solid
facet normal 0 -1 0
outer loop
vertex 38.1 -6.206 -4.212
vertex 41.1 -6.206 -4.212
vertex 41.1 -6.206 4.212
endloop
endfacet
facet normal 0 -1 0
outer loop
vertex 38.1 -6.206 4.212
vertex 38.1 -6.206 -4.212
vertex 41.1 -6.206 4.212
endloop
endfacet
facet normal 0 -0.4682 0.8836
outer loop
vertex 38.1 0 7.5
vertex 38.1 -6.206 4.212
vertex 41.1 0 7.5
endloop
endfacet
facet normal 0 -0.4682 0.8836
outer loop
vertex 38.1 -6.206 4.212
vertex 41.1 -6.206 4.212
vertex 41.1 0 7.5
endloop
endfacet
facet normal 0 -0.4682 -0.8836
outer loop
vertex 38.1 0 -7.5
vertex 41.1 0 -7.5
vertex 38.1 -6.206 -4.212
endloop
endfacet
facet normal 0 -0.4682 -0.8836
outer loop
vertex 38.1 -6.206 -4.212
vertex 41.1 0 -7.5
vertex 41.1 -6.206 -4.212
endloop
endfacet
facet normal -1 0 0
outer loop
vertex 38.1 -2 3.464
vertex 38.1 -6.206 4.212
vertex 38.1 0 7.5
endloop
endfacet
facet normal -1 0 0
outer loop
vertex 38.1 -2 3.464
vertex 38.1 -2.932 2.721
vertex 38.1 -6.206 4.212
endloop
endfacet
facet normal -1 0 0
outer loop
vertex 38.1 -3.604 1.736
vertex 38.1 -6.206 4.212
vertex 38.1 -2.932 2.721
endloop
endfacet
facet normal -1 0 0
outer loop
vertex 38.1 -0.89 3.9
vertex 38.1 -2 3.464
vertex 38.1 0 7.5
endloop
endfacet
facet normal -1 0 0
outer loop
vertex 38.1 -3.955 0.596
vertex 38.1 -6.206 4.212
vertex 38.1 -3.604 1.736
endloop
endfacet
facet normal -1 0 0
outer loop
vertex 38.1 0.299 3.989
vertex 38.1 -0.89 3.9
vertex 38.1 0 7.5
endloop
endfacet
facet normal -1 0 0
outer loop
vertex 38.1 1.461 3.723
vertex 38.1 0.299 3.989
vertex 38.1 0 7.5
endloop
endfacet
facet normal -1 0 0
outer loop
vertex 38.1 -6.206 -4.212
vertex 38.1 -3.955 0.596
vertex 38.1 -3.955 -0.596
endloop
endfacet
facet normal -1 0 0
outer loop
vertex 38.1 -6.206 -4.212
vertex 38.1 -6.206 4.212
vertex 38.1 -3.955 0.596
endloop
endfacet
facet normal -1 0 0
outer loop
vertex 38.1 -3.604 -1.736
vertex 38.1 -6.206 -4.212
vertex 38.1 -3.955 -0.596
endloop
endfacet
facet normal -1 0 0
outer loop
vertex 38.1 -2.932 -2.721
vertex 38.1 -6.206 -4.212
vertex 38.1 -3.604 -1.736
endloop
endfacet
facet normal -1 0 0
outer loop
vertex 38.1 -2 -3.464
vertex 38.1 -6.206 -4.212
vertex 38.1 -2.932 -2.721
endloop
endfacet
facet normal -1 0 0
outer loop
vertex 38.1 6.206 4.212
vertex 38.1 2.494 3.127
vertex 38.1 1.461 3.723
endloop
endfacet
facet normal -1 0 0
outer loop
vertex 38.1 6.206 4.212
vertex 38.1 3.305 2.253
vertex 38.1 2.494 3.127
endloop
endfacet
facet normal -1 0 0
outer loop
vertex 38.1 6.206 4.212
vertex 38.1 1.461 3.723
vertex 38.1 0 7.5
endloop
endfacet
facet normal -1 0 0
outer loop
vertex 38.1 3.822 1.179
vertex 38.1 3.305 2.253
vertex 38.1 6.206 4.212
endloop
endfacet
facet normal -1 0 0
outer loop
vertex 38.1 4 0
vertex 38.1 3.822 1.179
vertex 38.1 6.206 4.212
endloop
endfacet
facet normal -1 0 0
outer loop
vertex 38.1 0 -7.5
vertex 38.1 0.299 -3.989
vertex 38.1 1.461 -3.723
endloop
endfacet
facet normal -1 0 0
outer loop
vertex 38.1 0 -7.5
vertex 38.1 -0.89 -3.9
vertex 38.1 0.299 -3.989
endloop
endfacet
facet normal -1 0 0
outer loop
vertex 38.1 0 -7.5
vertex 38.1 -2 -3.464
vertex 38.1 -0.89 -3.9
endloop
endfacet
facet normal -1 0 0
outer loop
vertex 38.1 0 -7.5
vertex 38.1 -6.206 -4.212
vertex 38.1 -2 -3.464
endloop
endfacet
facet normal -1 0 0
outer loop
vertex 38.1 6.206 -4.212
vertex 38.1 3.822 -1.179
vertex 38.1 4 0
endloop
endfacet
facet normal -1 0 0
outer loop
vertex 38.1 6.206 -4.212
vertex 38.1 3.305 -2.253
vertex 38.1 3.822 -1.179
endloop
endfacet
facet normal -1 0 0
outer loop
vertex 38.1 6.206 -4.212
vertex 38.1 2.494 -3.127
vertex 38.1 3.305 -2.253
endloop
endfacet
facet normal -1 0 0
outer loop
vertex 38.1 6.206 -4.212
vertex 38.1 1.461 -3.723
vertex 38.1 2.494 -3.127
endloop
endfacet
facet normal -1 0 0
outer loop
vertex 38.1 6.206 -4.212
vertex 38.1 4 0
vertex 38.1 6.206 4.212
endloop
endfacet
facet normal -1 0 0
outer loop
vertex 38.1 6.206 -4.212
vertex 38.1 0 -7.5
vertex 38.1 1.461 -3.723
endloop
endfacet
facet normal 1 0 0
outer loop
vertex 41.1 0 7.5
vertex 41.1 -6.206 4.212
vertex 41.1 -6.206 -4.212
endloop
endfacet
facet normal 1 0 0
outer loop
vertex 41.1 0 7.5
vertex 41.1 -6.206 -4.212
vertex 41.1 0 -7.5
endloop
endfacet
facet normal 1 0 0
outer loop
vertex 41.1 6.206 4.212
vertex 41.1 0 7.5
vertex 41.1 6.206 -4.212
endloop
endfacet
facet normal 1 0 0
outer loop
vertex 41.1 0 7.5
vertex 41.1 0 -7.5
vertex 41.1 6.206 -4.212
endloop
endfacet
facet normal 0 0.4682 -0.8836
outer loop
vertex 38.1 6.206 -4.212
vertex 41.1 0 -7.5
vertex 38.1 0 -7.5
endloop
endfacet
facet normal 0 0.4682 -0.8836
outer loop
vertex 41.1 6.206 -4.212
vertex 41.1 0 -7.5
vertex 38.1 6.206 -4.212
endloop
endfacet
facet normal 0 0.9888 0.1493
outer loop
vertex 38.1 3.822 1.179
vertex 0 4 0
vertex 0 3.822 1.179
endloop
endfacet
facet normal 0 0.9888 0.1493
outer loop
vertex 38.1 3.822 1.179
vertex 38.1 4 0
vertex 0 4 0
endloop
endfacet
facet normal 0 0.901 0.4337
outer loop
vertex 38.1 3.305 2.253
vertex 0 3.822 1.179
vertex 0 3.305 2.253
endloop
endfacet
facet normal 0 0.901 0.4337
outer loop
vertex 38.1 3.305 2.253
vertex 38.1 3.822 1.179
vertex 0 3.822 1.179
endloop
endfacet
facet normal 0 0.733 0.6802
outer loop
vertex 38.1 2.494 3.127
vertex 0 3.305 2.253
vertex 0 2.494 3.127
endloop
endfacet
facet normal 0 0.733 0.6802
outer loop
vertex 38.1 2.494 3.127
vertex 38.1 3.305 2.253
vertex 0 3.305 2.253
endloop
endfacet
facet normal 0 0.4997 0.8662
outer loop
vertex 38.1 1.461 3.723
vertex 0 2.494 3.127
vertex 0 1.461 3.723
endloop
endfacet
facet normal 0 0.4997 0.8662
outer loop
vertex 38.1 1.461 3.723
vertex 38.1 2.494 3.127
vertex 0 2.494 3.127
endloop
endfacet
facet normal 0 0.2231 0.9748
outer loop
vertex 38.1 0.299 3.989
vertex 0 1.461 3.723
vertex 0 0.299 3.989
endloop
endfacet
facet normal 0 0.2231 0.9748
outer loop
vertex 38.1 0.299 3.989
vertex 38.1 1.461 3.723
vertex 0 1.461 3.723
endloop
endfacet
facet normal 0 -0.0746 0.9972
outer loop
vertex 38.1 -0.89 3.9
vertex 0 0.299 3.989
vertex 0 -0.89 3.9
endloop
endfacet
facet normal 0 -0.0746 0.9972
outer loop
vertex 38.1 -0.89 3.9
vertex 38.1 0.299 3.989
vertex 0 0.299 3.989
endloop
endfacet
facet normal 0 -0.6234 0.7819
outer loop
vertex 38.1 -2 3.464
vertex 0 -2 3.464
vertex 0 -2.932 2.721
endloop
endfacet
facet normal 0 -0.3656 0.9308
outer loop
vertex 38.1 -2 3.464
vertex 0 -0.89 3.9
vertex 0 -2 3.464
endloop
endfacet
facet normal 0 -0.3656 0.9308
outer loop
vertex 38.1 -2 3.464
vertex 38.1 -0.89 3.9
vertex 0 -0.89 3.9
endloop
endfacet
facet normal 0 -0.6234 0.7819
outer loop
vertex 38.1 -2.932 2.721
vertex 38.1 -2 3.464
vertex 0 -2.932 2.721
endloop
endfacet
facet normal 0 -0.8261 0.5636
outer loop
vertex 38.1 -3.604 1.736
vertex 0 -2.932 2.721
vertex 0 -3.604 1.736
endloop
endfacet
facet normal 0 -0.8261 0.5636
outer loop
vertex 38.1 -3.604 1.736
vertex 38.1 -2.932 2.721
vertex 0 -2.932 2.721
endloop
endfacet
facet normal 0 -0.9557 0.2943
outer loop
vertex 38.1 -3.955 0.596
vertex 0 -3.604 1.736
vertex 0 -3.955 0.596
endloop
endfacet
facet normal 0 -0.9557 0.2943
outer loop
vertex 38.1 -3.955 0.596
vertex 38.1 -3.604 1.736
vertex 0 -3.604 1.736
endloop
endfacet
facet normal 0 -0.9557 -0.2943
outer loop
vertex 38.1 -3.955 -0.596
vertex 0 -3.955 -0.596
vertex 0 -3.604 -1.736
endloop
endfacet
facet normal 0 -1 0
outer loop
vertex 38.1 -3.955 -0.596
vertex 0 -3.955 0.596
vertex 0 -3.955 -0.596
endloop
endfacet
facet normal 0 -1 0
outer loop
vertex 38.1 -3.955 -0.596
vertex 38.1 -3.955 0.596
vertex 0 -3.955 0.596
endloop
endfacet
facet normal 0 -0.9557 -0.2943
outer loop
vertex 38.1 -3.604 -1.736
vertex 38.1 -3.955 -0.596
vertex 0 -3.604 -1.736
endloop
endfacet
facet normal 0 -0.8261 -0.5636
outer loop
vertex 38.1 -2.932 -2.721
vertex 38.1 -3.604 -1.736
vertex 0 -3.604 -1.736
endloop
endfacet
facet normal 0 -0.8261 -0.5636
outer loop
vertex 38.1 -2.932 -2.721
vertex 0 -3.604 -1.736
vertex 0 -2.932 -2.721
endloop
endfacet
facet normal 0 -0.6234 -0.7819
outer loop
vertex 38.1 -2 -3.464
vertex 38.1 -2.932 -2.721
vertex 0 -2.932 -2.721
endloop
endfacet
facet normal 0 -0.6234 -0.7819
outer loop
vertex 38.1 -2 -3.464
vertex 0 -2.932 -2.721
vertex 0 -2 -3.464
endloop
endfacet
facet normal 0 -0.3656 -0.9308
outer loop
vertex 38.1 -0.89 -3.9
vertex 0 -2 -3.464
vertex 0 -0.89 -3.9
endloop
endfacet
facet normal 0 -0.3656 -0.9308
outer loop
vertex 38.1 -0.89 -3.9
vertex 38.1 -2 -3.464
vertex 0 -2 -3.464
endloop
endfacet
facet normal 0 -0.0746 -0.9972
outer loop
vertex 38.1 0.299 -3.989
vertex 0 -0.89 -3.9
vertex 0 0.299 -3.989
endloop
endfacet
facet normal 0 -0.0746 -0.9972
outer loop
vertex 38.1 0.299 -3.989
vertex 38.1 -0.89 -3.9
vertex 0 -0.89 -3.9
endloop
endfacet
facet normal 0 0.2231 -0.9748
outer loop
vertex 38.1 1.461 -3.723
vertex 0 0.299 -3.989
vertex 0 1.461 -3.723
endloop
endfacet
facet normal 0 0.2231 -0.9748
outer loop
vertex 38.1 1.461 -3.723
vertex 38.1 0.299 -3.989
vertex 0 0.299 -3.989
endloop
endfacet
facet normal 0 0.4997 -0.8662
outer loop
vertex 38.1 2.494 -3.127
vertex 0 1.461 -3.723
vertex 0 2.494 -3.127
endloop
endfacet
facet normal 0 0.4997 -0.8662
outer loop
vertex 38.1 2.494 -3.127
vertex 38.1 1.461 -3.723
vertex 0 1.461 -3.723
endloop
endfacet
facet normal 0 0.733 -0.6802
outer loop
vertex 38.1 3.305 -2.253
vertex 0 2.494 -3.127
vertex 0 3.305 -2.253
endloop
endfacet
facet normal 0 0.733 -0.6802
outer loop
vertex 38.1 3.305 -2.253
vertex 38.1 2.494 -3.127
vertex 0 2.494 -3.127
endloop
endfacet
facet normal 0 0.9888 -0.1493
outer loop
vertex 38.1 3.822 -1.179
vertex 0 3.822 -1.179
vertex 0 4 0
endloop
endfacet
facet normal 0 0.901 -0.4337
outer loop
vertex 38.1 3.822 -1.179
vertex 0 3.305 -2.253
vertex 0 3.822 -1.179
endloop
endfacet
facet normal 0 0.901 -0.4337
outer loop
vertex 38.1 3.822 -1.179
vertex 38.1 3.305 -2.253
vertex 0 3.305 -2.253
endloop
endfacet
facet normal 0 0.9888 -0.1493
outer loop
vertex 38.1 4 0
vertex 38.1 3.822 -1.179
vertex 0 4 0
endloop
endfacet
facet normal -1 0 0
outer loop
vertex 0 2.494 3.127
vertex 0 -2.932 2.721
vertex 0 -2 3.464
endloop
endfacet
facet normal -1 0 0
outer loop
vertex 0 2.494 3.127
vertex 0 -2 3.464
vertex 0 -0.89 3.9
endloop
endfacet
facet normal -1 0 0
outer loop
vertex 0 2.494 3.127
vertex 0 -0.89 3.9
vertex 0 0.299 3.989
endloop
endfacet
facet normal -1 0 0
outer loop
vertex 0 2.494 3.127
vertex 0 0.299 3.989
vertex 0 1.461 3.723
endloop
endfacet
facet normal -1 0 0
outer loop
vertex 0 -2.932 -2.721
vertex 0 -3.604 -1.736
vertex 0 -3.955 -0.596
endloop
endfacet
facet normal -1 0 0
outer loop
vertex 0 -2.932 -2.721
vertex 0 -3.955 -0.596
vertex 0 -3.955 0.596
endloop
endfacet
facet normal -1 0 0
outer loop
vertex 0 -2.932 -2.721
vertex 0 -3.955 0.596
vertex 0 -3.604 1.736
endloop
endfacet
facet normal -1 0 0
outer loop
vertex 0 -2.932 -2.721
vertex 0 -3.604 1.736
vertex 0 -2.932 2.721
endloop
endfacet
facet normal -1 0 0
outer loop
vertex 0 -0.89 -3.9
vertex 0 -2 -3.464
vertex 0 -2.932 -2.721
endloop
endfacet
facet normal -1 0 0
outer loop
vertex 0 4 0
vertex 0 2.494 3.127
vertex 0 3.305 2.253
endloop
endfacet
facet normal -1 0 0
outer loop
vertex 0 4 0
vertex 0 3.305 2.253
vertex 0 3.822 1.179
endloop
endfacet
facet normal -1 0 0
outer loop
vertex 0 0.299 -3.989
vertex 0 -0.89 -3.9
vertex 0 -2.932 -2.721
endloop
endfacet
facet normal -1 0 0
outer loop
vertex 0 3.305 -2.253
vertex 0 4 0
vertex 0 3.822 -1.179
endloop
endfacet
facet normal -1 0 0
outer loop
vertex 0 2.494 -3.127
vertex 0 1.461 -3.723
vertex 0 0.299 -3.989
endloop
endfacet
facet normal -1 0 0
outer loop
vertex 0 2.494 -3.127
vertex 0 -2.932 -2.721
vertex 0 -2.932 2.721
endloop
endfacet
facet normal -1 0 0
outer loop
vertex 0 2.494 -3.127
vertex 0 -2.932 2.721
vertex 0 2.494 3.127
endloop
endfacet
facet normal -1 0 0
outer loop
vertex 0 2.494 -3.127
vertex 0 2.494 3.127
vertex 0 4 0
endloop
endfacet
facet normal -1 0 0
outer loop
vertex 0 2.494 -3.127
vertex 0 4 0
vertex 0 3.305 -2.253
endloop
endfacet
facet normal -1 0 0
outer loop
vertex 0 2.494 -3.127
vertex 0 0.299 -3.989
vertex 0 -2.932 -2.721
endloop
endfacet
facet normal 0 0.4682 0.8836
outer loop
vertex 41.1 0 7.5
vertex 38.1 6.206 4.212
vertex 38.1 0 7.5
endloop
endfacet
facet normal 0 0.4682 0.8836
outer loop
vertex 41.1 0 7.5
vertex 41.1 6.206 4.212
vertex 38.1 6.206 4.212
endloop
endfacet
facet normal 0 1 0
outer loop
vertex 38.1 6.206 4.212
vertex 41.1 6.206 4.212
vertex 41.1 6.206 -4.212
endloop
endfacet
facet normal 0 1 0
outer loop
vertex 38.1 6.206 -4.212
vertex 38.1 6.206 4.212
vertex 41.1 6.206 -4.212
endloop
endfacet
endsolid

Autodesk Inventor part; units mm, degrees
ref_plane "YZ Plane" through (0, 0, 0) normal (1, 0, 0) x (0, 1, 0)
ref_plane "XZ Plane" through (0, 0, 0) normal (0, 1, 0) x (-1, 0, 0)
ref_plane "XY Plane" through (0, 0, 0) normal (0, 0, 1) x (1, 0, 0)
sketch "Sketch1" plane through (0, 0, 0) normal (0, 0, 1) x (1, 0, 0)
  line L0 (0, 0) -> (0, 4)
  line L1 (0, 4) -> (38.1, 4)
  line L2 (38.1, 4) -> (38.1, 7.5)
  line L3 (38.1, 7.5) -> (41.1, 7.5)
  line L4 (41.1, 7.5) -> (41.1, 0)
  line L5 (41.1, 0) -> (0, 0)
  dimension "d0" = 4
  dimension "d1" = 38.1
  dimension "d2" = 3
  dimension "d3" = 7.5
revolve "Revolution1" add sketch "Sketch1" angle 360 about axis through (41.1, 0, 0) along (-1, 0, 0)
sketch "Sketch2" plane through (41.1, 0, 0) normal (1, 0, 0) x (0, 0, -1)
  circle A0 centre (0, 0) radius 7.5 projected
  line L0 (-4.212, 6.2056) -> (4.212, 6.2056)
  line L1 (7.5, 0) -> (4.212, 6.2056)
  line L2 (7.5, 0) -> (4.212, -6.2056)
  line L3 (4.212, -6.2056) -> (-4.212, -6.2056)
  line L4 (-4.212, -6.2056) -> (-7.5, 0)
  line L5 (-4.212, 6.2056) -> (-7.5, 0)
extrude "Extrusion1" cut sketch "Sketch2" against normal up to next contours L1 A0 | A0 L2 | L0 A0 | A0 L3 | L5 A0 | A0 L4
properties part number "8mm_x_rail_connection"
